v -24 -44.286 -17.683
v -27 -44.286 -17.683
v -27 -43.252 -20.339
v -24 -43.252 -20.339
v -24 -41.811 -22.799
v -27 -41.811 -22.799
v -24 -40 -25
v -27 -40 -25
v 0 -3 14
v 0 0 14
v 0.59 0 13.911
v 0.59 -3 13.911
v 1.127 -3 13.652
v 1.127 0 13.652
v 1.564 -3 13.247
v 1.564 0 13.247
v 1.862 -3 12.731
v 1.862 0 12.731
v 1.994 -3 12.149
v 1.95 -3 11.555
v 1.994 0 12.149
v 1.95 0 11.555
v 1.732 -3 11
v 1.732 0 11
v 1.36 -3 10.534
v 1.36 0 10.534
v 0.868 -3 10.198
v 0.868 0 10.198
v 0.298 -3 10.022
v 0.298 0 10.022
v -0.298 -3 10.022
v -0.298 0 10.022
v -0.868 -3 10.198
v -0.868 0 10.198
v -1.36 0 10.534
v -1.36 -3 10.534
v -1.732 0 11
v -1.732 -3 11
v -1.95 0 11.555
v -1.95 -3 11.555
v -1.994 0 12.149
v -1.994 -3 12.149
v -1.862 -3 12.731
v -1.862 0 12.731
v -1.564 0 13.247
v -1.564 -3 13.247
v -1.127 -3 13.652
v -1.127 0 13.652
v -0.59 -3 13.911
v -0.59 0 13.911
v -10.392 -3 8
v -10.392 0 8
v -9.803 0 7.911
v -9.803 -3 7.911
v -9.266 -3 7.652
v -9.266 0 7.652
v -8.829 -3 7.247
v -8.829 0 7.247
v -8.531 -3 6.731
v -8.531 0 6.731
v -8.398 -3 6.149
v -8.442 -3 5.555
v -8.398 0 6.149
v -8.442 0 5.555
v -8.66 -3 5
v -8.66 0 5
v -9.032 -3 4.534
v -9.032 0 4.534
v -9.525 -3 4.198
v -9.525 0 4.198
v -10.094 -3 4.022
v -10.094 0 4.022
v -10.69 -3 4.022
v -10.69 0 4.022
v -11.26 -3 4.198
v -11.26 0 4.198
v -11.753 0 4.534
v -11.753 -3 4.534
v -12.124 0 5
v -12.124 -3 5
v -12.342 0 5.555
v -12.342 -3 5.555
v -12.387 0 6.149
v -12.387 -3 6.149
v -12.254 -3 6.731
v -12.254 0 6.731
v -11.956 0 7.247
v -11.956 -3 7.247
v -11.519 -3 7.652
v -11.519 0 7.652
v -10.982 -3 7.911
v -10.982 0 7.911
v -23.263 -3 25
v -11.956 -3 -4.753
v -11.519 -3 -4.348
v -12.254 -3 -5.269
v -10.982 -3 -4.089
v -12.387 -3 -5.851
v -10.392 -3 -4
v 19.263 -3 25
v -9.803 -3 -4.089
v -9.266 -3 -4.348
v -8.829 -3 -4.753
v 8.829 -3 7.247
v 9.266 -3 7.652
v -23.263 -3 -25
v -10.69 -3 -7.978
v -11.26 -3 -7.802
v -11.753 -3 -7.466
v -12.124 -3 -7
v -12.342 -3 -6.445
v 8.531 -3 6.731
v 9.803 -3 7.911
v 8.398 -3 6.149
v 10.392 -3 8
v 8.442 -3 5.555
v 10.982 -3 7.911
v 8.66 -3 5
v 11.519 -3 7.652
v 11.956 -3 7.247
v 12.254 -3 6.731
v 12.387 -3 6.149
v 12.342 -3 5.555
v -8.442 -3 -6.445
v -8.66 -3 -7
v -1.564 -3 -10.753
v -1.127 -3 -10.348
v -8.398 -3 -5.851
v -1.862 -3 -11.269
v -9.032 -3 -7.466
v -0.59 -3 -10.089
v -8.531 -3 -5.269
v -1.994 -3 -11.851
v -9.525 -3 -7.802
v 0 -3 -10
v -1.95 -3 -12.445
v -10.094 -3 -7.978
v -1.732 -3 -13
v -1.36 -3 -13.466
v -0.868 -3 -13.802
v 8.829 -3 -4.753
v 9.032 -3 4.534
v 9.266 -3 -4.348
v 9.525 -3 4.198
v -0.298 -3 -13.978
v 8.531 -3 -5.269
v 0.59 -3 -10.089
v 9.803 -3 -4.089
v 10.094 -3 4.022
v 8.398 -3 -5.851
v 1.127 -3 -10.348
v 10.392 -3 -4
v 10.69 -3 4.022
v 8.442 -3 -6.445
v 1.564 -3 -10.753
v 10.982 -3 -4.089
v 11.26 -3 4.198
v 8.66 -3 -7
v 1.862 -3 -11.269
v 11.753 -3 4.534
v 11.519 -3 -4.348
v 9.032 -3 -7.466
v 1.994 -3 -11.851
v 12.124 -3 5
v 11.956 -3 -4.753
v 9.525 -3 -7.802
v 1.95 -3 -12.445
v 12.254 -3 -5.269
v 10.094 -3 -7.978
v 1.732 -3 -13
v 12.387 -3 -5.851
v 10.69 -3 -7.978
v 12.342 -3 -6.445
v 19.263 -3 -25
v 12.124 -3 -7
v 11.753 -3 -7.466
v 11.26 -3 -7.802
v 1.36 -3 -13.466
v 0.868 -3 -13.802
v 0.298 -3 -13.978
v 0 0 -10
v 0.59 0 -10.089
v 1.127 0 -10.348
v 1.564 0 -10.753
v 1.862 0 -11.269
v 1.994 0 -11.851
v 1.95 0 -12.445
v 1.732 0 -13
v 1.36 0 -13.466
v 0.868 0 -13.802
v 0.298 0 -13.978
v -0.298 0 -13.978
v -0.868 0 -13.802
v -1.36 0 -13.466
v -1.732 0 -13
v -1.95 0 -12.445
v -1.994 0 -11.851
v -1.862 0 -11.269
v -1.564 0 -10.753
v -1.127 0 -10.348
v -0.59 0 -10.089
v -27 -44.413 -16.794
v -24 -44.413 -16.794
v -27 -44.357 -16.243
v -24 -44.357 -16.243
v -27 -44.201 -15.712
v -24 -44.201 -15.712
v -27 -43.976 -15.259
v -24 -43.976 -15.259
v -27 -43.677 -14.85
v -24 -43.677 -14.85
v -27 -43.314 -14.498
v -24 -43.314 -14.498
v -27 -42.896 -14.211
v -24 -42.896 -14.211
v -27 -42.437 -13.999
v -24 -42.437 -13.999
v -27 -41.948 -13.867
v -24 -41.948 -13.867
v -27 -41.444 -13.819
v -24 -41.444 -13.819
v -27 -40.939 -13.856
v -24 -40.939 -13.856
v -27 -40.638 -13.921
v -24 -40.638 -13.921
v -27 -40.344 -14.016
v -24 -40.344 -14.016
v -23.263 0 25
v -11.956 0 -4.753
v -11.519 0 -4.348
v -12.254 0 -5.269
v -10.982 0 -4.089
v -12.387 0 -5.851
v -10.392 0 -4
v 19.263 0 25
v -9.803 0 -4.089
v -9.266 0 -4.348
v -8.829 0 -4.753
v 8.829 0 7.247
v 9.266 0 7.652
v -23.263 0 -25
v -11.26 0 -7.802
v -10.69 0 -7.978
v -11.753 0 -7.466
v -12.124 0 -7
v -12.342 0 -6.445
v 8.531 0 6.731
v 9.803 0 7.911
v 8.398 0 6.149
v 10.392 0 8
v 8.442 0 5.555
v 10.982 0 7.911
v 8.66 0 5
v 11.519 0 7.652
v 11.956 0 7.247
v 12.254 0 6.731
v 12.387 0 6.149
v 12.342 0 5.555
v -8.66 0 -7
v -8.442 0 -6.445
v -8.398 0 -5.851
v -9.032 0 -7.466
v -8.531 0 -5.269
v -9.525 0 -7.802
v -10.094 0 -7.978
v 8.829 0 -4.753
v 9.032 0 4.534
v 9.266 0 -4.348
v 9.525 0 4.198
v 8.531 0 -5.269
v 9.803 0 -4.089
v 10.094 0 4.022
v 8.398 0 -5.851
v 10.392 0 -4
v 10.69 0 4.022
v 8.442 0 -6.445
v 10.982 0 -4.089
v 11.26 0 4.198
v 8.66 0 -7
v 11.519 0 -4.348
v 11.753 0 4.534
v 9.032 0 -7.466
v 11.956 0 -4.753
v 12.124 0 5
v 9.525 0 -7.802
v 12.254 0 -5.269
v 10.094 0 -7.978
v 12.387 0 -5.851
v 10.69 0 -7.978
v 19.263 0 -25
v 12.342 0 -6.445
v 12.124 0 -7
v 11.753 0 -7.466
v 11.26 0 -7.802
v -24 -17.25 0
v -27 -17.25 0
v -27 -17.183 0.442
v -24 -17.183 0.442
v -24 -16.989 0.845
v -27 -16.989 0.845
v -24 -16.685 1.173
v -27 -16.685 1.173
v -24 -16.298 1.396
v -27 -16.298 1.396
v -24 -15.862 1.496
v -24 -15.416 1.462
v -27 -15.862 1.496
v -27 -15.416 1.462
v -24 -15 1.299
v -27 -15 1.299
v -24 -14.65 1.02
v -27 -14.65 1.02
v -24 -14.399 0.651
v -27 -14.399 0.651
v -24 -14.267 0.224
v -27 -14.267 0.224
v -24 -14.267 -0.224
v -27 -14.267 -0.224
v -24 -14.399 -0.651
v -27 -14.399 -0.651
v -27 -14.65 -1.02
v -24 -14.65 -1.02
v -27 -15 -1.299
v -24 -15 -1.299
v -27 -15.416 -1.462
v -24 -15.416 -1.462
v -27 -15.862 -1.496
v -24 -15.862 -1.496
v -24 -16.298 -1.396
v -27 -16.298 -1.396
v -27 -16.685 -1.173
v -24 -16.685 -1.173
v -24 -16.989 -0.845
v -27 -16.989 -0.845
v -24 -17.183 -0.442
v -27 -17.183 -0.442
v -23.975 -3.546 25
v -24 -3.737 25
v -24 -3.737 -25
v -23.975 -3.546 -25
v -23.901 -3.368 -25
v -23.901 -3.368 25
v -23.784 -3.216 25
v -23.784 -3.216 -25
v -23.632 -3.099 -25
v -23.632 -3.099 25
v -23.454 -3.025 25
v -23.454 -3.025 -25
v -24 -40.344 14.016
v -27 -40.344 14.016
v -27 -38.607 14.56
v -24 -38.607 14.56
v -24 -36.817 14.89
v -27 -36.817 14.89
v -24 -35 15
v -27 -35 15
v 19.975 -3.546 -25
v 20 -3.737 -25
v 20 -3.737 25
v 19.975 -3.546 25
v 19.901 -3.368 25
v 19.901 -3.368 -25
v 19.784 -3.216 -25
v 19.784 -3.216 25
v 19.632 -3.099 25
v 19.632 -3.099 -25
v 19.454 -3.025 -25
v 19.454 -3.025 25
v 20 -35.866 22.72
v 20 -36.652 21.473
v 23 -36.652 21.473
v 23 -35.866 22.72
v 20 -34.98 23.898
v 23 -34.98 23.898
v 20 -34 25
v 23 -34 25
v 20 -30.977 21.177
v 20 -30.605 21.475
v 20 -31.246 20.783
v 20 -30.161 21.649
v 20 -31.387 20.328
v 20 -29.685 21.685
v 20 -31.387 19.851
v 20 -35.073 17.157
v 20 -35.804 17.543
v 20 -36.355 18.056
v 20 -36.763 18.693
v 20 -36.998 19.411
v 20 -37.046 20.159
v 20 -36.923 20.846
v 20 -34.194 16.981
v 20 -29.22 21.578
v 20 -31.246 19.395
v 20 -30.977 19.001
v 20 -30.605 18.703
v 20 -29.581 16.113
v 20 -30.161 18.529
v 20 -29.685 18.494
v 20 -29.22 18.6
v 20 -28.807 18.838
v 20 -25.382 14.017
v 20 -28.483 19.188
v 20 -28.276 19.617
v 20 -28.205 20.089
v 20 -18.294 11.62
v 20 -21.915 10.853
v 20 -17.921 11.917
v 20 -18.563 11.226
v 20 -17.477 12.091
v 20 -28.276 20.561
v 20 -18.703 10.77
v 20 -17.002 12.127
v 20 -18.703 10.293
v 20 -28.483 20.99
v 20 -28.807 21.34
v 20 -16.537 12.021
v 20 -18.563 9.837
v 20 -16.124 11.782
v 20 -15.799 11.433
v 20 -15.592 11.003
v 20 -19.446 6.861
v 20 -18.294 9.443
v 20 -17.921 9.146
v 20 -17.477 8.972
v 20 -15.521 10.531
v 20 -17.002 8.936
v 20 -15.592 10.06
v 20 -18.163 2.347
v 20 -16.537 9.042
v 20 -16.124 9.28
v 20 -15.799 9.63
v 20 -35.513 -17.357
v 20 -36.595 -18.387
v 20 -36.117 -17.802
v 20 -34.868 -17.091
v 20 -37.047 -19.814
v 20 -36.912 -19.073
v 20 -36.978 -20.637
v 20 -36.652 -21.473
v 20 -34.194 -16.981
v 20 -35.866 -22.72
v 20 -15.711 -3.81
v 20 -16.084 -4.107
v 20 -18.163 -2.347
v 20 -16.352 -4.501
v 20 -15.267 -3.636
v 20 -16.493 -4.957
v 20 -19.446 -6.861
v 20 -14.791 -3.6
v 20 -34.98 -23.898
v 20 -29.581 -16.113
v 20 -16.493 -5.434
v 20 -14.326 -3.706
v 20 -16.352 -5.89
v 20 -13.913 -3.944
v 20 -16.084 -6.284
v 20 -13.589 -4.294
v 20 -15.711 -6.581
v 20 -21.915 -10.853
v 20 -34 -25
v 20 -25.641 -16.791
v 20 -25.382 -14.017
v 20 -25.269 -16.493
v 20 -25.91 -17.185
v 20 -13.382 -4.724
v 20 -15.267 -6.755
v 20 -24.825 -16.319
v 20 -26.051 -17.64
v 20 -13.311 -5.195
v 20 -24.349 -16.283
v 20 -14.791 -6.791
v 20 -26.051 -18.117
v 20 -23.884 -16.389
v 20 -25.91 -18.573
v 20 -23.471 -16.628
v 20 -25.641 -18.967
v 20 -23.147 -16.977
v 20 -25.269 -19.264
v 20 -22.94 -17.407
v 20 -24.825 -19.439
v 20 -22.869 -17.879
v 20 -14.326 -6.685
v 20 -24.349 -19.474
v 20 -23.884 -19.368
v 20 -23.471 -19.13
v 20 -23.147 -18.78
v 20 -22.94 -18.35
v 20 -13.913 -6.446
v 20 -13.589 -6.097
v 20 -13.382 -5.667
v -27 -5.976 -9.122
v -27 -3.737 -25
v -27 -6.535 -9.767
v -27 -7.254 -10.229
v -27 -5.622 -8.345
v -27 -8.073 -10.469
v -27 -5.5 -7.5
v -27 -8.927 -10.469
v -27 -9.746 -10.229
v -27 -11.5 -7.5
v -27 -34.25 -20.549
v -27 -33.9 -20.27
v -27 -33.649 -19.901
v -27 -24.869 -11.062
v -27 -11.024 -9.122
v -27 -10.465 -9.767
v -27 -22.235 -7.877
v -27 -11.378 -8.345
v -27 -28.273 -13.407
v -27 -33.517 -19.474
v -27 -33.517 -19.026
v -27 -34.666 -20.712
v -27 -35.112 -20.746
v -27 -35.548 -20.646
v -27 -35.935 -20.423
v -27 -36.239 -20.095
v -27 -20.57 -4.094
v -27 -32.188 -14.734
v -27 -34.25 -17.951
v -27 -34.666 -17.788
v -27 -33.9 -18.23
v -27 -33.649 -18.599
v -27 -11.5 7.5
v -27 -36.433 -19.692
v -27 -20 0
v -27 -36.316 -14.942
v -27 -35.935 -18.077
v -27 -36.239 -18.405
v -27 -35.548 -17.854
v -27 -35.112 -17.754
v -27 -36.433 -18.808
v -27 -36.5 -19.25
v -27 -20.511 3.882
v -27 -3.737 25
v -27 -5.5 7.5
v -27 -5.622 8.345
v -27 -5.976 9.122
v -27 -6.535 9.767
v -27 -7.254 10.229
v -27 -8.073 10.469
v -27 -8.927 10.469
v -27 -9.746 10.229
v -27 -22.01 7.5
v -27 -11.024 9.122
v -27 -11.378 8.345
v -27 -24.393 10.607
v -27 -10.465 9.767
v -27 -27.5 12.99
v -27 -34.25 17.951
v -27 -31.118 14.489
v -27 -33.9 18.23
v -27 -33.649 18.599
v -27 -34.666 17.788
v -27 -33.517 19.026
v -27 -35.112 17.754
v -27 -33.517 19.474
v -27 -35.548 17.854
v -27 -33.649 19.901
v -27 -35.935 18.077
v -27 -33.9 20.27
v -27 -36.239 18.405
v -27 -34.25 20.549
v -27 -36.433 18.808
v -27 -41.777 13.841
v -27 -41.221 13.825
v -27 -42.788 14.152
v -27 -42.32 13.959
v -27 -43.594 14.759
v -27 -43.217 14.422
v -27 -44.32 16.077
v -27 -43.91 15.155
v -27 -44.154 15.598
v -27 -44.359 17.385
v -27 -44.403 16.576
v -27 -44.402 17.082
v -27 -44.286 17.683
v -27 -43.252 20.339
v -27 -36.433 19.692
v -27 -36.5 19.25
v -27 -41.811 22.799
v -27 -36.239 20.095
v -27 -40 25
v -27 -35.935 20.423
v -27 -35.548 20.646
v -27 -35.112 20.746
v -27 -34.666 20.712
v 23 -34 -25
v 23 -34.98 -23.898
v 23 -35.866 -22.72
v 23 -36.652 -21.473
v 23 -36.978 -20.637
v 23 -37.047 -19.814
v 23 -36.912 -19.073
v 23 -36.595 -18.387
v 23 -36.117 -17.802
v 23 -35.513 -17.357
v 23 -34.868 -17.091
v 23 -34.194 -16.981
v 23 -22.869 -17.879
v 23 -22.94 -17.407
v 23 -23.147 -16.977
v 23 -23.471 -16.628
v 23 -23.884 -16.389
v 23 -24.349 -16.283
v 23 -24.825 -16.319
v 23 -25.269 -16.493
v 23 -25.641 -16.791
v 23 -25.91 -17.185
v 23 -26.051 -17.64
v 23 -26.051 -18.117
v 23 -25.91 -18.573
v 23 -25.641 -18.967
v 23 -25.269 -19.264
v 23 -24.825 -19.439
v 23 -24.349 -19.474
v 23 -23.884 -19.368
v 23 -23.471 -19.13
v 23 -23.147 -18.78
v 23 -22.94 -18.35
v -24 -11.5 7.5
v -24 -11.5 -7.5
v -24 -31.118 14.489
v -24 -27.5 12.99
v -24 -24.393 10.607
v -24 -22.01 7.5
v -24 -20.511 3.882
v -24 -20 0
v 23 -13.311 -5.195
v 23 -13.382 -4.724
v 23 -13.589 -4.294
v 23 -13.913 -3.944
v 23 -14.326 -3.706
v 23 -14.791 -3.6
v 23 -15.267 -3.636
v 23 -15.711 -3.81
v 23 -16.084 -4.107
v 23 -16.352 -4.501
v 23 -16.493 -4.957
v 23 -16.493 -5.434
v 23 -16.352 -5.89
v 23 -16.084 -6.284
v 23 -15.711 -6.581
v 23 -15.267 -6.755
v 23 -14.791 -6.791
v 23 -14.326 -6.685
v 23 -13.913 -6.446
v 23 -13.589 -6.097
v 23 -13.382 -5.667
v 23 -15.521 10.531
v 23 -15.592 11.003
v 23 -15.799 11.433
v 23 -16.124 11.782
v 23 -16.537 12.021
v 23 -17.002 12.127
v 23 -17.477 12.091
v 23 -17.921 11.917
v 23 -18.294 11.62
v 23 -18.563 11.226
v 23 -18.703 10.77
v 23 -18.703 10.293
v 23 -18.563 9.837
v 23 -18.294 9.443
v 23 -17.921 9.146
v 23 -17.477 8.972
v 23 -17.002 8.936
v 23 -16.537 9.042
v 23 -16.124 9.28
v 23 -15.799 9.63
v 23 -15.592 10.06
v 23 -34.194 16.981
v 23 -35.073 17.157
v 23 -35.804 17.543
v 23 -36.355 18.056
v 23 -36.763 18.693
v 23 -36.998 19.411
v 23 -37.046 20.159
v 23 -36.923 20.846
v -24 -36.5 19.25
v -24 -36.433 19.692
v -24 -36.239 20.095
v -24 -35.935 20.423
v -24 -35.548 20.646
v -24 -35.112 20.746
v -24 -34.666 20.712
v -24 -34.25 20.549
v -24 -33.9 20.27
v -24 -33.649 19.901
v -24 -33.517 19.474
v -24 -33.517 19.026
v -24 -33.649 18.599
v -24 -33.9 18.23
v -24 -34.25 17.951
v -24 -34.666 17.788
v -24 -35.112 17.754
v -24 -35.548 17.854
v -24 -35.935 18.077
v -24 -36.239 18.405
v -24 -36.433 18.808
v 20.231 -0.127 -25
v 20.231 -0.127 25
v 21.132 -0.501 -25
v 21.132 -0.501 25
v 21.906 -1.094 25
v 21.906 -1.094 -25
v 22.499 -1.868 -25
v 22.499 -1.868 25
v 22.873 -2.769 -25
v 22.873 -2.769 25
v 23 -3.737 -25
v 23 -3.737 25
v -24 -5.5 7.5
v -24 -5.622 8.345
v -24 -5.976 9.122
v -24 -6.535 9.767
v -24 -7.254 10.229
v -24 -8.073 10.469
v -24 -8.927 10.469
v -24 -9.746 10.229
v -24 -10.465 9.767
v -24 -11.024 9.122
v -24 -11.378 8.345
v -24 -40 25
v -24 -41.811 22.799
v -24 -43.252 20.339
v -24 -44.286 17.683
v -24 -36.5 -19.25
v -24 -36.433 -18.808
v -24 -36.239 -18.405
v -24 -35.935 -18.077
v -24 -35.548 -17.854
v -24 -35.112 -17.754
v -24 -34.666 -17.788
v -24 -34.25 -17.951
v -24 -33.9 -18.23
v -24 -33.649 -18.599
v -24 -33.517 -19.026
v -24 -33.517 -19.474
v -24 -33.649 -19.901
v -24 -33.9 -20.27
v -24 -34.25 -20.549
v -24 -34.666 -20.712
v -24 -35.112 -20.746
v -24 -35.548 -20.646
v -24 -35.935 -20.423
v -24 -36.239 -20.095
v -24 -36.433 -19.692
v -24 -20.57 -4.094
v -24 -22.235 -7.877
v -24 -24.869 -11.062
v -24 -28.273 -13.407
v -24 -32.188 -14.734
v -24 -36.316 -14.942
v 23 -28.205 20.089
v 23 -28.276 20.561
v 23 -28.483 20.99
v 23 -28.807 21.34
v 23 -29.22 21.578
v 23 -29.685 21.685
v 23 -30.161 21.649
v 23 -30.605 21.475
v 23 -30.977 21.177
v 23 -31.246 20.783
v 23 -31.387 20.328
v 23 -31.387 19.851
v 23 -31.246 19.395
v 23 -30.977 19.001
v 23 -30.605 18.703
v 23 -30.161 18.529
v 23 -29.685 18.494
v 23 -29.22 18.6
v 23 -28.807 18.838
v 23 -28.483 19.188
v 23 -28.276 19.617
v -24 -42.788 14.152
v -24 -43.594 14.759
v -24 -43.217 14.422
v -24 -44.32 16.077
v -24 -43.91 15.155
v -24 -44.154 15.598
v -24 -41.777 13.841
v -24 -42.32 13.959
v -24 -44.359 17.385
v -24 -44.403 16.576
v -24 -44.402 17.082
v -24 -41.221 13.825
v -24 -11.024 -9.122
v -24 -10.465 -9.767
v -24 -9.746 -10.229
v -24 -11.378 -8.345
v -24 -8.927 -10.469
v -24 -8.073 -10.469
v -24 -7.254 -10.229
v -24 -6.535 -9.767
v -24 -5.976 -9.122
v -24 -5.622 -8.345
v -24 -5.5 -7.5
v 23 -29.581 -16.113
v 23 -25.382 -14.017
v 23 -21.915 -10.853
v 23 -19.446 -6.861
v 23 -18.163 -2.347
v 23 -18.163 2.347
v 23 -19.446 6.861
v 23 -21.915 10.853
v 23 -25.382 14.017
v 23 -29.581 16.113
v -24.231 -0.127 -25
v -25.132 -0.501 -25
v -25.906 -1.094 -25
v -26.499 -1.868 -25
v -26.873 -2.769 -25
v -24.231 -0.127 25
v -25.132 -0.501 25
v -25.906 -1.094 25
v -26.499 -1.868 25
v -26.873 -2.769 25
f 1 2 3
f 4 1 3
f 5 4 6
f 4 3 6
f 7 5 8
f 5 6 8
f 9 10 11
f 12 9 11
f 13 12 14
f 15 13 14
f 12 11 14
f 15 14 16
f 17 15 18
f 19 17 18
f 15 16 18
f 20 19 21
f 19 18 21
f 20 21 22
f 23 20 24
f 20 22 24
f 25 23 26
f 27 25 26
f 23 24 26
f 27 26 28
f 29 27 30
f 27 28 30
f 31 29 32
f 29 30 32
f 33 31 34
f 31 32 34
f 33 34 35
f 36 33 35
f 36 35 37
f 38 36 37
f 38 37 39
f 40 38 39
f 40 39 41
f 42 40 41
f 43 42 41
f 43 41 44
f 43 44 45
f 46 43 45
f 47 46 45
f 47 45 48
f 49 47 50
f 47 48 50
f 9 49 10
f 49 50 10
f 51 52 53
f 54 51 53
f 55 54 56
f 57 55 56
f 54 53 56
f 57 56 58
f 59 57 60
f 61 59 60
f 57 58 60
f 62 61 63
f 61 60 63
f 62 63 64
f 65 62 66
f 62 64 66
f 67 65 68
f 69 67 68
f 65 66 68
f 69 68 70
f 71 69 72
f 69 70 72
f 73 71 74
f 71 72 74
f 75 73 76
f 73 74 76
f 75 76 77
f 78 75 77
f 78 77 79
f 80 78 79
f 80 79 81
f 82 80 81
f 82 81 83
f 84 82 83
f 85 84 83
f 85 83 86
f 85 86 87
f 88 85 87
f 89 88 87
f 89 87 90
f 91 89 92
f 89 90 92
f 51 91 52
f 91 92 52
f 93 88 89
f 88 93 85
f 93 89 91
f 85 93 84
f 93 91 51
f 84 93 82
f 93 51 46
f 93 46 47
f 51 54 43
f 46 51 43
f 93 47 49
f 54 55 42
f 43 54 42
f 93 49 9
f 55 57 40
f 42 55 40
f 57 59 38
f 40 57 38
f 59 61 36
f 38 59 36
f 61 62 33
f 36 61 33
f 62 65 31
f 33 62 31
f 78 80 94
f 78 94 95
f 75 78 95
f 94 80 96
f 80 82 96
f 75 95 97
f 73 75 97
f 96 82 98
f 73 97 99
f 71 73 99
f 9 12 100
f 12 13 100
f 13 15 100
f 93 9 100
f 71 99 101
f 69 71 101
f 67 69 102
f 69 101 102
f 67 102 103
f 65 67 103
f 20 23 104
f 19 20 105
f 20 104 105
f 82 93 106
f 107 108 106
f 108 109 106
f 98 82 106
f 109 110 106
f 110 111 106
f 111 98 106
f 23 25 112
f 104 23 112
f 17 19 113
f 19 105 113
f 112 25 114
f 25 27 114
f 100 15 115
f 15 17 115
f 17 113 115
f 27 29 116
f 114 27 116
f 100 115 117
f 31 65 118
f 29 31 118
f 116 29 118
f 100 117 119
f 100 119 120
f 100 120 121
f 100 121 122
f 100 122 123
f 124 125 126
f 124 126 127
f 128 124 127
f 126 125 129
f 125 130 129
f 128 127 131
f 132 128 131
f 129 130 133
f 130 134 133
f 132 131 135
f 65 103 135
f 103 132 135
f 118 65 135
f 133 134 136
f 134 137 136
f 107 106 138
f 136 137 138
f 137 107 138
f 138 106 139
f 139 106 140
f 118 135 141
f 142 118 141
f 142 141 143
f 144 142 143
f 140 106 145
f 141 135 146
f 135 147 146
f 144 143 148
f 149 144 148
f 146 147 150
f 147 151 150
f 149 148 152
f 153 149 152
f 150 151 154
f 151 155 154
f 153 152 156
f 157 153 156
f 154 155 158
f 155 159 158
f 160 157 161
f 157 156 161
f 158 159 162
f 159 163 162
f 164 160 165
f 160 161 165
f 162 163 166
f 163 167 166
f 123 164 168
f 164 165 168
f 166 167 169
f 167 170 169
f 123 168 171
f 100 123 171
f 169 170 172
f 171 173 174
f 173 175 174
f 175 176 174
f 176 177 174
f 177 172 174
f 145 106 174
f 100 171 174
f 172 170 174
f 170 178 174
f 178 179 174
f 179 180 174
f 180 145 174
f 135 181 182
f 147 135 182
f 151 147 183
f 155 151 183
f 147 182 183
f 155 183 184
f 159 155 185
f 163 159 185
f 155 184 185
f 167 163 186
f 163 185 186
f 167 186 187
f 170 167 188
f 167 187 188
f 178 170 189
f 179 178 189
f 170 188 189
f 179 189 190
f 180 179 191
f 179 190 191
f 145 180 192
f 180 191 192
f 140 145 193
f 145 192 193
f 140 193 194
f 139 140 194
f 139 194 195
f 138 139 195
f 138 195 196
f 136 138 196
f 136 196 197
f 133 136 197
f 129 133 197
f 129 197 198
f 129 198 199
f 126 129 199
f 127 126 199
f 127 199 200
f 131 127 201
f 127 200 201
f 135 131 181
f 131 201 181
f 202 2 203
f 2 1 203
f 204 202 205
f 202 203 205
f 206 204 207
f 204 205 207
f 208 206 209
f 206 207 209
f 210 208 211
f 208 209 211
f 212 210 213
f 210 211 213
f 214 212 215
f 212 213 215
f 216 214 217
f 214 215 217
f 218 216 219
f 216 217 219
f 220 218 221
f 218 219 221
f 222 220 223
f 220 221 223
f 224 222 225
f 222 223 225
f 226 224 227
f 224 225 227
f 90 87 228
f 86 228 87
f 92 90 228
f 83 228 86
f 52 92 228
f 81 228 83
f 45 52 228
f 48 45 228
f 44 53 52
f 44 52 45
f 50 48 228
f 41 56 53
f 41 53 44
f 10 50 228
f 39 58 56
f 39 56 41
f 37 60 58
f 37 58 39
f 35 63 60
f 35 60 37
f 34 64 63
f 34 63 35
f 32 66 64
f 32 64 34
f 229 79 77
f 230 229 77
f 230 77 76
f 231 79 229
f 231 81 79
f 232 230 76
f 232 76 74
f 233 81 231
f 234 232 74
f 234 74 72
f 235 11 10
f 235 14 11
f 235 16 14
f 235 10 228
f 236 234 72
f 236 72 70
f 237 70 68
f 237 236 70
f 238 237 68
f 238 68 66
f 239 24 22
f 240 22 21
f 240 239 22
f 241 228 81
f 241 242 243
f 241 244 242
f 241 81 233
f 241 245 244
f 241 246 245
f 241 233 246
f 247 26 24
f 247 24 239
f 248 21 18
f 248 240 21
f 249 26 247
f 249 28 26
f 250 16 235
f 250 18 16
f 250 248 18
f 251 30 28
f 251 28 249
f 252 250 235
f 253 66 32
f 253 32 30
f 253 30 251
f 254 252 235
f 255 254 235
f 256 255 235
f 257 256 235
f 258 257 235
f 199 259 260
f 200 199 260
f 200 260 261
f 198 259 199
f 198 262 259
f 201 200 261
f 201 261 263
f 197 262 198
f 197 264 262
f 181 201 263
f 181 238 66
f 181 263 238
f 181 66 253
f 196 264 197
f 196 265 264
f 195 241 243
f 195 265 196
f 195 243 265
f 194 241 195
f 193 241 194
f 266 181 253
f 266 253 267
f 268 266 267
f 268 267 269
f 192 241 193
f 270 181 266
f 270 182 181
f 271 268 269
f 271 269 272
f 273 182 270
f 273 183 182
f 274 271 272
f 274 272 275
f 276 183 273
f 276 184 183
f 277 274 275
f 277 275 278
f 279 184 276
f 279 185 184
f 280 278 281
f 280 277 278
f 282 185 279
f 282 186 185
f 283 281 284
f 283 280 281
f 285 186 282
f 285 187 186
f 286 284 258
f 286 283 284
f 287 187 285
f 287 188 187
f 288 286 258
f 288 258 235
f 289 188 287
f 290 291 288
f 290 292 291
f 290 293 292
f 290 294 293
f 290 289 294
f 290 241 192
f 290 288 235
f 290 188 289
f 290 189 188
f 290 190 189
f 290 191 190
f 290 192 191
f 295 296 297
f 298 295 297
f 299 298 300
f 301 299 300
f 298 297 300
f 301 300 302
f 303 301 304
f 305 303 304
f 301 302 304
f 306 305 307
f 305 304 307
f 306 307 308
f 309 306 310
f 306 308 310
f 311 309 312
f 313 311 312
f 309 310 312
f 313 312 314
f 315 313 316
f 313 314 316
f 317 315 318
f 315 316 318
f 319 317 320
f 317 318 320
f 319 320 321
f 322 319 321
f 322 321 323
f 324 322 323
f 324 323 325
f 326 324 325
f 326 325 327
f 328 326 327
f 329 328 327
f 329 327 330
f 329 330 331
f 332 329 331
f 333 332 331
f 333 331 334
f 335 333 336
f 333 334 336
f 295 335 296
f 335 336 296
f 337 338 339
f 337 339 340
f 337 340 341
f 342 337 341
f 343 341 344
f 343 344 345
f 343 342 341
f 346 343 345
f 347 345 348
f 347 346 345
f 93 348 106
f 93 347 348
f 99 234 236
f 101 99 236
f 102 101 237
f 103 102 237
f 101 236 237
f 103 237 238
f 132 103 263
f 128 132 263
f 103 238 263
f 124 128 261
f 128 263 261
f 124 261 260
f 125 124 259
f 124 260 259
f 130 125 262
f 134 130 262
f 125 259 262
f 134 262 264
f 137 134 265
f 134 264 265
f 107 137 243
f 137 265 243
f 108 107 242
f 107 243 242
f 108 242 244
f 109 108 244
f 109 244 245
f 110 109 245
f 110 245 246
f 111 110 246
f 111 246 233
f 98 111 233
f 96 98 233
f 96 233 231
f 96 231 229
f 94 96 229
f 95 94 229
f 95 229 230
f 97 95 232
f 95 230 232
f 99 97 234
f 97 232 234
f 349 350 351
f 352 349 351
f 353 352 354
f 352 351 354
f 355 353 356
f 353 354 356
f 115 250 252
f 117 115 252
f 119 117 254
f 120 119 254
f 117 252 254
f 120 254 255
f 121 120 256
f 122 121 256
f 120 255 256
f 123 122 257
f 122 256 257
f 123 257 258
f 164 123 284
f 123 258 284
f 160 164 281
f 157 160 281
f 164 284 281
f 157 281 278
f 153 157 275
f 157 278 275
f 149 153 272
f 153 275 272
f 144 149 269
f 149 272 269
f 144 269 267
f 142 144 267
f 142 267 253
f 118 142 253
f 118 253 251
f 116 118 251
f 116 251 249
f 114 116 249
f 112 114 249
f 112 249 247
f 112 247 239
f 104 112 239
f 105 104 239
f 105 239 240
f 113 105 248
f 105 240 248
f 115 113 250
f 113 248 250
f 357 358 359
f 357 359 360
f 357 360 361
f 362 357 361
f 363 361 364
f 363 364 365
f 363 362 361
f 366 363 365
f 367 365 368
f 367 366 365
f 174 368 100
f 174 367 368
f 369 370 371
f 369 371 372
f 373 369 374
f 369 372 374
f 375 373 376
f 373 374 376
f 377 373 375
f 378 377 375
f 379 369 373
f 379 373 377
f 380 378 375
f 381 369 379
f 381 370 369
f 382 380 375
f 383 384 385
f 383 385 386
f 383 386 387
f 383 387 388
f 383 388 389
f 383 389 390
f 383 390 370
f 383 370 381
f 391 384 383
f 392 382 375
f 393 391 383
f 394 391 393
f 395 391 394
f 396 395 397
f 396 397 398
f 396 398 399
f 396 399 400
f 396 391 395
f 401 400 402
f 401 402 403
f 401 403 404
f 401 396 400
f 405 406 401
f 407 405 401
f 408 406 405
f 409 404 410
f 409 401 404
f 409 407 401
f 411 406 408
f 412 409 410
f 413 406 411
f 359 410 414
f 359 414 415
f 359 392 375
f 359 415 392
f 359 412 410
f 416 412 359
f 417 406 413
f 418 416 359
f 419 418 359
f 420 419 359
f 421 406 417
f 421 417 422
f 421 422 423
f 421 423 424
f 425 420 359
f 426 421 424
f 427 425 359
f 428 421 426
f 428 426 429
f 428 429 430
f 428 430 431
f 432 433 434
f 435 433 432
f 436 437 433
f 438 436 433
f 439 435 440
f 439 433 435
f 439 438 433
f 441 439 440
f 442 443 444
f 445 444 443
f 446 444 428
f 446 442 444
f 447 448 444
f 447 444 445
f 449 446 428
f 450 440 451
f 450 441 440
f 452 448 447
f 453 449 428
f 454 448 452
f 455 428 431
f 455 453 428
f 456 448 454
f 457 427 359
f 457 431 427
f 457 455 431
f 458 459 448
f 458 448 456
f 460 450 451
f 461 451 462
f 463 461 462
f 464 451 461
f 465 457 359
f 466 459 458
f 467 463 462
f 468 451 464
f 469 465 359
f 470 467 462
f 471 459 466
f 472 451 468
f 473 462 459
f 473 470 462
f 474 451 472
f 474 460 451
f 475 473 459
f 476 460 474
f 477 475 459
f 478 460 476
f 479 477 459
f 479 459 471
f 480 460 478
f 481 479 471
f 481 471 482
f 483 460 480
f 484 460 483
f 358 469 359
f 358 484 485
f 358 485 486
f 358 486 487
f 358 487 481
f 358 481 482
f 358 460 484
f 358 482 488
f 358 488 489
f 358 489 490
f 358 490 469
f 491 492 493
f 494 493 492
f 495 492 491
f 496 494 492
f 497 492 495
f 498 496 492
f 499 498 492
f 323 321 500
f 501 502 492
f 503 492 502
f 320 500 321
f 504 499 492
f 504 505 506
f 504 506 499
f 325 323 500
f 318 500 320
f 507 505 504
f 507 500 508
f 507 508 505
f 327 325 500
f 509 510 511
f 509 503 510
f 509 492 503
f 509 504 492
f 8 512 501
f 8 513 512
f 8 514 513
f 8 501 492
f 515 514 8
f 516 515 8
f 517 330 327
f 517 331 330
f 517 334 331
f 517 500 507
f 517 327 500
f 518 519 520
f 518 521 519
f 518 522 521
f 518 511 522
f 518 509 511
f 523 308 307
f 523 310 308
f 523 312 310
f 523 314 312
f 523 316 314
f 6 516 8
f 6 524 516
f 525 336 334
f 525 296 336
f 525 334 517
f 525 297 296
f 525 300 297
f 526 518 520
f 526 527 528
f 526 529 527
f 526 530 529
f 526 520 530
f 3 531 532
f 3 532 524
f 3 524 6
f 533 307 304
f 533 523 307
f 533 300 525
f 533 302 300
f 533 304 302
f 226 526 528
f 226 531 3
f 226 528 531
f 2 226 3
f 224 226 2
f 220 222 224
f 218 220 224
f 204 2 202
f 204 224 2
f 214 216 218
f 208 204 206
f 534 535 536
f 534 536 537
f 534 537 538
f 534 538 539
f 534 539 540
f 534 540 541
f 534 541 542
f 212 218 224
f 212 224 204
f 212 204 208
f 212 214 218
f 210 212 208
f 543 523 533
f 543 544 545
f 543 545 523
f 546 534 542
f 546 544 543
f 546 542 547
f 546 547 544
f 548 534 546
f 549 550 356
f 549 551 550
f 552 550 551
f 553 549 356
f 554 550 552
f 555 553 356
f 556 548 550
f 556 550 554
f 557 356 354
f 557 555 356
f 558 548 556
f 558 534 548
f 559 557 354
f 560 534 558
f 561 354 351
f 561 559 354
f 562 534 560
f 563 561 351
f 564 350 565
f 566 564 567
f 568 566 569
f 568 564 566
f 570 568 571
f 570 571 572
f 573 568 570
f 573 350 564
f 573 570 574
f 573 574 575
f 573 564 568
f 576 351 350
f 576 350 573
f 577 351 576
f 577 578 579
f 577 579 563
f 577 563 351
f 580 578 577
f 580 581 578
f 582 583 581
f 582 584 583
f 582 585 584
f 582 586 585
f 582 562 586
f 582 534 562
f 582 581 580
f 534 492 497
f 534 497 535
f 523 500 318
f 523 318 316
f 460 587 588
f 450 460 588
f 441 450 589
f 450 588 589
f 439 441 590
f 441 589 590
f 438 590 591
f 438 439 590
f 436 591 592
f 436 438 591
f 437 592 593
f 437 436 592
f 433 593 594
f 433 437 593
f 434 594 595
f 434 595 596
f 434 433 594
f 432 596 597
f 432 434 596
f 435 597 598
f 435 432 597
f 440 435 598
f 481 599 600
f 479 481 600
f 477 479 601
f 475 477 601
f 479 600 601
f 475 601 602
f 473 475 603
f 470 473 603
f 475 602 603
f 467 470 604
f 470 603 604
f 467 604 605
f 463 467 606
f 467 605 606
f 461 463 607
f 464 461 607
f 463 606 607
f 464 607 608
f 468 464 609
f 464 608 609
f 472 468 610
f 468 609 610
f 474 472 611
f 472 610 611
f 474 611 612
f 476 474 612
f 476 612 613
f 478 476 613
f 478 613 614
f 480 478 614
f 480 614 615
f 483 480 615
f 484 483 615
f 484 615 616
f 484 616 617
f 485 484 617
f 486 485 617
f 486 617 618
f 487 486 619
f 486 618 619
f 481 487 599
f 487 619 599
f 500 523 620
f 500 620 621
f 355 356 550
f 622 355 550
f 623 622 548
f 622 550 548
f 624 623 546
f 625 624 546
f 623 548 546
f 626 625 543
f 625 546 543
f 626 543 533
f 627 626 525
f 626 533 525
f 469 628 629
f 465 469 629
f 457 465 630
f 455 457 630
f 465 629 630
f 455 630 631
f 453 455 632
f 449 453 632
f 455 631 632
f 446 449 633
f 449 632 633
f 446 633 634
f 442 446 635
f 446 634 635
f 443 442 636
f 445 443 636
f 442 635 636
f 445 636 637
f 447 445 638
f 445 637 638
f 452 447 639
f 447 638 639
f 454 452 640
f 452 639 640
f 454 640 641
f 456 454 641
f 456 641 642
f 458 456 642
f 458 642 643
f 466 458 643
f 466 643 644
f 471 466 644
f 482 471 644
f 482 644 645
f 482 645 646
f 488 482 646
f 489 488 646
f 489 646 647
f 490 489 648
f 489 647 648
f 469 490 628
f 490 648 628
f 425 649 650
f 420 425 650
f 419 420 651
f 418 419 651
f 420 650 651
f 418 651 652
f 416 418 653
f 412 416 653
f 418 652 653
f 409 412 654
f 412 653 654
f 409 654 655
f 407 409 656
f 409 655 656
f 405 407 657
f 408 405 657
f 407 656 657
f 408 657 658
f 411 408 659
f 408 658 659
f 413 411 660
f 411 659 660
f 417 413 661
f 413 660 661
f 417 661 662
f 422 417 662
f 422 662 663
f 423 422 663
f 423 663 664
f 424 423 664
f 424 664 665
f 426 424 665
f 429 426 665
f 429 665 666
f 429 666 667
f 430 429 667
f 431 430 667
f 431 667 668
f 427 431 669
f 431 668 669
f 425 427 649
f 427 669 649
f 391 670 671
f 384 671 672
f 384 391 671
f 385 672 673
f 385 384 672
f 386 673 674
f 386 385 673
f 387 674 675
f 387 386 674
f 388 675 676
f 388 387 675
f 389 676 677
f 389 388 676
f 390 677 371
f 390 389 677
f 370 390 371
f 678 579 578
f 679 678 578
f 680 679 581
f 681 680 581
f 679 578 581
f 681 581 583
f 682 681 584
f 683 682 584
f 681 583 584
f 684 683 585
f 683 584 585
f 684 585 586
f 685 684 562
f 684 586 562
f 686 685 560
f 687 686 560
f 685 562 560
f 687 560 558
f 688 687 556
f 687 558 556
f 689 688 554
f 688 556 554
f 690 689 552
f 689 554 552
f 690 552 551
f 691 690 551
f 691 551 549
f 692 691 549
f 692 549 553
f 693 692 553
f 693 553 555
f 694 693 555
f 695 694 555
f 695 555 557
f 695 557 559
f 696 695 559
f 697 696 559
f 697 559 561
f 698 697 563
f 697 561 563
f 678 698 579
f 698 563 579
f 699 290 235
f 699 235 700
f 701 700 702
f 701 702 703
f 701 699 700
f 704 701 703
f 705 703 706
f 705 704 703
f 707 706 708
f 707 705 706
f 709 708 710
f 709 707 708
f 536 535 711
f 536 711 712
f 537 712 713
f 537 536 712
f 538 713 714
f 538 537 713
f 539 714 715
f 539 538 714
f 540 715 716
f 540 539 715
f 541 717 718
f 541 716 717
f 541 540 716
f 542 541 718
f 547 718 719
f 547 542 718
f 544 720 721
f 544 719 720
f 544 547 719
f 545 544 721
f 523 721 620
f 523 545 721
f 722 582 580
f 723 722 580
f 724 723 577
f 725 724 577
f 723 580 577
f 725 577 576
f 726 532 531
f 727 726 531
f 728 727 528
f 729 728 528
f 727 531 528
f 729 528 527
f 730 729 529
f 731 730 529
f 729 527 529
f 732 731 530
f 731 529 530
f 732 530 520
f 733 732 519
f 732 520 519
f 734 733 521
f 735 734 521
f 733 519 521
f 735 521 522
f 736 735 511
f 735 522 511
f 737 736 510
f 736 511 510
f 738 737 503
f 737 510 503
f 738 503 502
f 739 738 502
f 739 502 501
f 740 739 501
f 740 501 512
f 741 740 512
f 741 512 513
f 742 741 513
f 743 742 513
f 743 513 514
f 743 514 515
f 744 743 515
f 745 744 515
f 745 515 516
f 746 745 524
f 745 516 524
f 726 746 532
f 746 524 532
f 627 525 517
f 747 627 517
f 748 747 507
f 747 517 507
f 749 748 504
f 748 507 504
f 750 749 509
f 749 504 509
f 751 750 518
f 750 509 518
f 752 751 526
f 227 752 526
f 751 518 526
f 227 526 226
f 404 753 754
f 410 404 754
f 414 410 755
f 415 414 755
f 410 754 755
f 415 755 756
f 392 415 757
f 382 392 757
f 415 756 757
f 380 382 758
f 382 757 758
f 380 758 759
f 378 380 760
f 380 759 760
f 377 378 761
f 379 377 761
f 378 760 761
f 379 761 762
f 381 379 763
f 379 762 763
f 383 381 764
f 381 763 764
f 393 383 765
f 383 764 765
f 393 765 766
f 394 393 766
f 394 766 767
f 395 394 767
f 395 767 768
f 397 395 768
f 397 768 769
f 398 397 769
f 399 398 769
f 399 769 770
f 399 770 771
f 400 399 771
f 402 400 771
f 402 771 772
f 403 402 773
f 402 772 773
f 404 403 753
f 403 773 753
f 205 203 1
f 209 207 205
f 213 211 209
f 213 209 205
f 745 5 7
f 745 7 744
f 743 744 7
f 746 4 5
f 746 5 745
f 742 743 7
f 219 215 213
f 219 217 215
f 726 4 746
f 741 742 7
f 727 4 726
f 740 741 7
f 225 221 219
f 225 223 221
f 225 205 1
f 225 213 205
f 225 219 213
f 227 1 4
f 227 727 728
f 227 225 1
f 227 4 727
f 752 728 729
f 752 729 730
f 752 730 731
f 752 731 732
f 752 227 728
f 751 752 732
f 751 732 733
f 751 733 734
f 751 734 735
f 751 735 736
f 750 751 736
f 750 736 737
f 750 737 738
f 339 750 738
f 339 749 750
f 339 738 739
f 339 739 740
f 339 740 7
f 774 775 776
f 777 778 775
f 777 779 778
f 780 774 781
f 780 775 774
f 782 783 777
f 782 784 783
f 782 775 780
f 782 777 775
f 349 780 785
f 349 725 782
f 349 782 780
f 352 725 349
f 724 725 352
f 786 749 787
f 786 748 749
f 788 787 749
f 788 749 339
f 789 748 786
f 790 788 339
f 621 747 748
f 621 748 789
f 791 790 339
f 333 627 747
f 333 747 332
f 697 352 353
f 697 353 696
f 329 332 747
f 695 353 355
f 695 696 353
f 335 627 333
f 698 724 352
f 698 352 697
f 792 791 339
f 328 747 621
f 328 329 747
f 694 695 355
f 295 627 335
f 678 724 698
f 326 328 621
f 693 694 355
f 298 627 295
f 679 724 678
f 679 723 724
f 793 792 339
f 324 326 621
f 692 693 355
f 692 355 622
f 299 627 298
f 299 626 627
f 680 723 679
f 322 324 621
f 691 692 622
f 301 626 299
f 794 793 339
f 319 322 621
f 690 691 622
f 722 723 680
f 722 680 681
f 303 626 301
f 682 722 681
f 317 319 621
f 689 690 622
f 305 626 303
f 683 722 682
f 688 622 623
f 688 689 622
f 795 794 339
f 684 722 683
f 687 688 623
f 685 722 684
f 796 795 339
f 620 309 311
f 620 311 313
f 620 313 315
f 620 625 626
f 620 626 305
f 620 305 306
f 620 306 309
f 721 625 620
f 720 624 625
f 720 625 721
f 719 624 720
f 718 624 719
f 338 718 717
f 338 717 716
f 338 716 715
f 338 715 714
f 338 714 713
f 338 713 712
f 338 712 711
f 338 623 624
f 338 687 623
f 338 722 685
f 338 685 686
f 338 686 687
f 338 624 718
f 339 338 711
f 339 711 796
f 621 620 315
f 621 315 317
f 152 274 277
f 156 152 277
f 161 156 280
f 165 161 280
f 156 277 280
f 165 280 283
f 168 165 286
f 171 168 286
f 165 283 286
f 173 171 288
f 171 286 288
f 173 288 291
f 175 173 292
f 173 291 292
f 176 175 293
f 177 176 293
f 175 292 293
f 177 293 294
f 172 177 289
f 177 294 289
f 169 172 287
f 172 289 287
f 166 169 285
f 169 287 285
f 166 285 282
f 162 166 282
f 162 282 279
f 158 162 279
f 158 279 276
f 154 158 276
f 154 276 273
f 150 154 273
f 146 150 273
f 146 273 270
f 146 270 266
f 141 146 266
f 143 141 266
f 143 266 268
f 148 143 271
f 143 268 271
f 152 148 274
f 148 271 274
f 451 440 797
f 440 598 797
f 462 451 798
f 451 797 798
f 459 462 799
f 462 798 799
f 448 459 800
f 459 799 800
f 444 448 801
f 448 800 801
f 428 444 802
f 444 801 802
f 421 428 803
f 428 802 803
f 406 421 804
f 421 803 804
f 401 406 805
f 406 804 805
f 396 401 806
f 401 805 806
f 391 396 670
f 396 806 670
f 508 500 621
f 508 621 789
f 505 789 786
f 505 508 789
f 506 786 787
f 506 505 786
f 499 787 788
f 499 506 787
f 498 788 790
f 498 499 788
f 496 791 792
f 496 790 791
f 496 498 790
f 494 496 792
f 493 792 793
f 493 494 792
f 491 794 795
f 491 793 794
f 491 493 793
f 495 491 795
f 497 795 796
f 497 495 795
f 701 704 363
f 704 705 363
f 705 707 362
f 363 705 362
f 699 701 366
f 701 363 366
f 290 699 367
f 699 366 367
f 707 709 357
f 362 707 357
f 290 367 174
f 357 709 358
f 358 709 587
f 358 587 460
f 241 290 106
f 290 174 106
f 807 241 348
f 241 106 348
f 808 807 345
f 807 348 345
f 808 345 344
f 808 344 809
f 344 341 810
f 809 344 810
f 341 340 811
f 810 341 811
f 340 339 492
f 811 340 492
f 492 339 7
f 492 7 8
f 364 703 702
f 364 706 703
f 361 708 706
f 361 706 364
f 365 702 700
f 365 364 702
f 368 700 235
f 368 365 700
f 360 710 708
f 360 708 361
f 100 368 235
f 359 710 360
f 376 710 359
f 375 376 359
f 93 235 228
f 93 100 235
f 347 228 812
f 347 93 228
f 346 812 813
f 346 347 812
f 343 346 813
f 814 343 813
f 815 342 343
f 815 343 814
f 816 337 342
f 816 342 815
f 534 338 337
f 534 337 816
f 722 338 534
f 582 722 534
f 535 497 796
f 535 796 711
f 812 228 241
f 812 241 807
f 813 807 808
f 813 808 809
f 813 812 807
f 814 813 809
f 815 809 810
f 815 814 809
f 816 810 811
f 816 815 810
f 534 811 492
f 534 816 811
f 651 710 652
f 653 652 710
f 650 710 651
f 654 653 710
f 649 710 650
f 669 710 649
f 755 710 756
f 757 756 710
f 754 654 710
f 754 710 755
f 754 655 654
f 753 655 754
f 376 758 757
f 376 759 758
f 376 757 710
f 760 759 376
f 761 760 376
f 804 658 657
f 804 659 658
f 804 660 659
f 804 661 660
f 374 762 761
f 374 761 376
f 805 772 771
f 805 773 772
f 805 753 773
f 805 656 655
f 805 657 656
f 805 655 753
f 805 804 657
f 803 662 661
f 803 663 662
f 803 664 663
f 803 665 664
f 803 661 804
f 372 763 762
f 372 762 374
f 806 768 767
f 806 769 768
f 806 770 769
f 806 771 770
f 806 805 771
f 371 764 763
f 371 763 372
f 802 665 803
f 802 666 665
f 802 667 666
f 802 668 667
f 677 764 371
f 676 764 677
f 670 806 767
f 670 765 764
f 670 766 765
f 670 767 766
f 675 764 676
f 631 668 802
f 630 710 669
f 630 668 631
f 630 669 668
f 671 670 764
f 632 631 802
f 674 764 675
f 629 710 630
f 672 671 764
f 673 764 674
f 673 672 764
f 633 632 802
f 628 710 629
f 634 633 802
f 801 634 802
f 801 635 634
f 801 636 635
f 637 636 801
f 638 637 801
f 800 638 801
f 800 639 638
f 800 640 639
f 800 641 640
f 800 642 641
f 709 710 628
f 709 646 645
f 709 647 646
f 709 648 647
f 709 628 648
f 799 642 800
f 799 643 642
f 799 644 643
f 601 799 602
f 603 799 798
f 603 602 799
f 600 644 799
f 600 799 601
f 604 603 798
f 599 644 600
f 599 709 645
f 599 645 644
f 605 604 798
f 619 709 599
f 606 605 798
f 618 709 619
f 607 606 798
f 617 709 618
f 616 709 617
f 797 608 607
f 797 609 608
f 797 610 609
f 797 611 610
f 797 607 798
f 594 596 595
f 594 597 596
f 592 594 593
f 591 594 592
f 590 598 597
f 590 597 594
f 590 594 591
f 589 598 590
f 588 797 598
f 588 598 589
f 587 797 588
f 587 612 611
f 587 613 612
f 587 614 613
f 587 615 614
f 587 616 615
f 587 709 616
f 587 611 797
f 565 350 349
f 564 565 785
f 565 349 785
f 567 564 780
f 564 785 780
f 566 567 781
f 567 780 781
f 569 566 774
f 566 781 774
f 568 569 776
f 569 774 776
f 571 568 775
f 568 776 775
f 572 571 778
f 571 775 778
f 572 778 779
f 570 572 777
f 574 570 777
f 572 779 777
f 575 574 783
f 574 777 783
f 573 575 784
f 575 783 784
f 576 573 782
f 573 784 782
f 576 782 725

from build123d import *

# Parameters (mm, degrees)
SKETCH_1_W                       = 44
SKETCH_1_H                       = 50
SKETCH_1_R                       = 2
SM_BASE_FLANGE_1_DEPTH           = 3
SM_EDGE_FLANGE_1_STRIP_W         = 13.4732
SM_EDGE_FLANGE_1_STRIP_H         = 3
SM_EDGE_FLANGE_1_STRIP_CUT_DEPTH = 50
SM_EDGE_FLANGE_1_DEPTH           = 50
SM_EDGE_FLANGE_2_STRIP_W         = 13.4732
SM_EDGE_FLANGE_2_STRIP_H         = 3
SM_EDGE_FLANGE_2_STRIP_CUT_DEPTH = 50
SM_EDGE_FLANGE_2_DEPTH           = 50
SKETCH_15_R                      = 15
SKETCH_15_R_2                    = 1.5
CUT_EXTRUDE_1_DEPTH              = 3
SKETCH_16_R                      = 1.6
SKETCH_16_R_2                    = 17
CUT_EXTRUDE_2_DEPTH              = 3
CUT_EXTRUDE_5_DEPTH              = 3
SKETCH_18_R                      = 1.6
CUT_EXTRUDE_6_DEPTH              = 3
FILLET_2_R                       = 3
CUT_EXTRUDE_7_DEPTH              = 10


# Sheet-metal steps are written as plain solids
with BuildPart() as part:
    # Sketch 1 → 基体-法兰1 (new body)
    with BuildSketch(Plane(origin=(0, 0, 0), x_dir=(1, 0, 0), z_dir=(0, 1, 0))):
        with Locations((-2, 0)):
            Rectangle(SKETCH_1_W, SKETCH_1_H)
        with Locations(Location((0, 12, 0), (0, 0, 270))):
            Circle(SKETCH_1_R, mode=Mode.SUBTRACT)
        with Locations(Location((10.392304845, 6, 0), (0, 0, 270))):
            Circle(SKETCH_1_R, mode=Mode.SUBTRACT)
        with Locations(Location((10.392304845, -6, 0), (0, 0, 270))):
            Circle(SKETCH_1_R, mode=Mode.SUBTRACT)
        with Locations(Location((0, -12, 0), (0, 0, 270))):
            Circle(SKETCH_1_R, mode=Mode.SUBTRACT)
        with Locations(Location((-10.392304845, -6, 0), (0, 0, 270))):
            Circle(SKETCH_1_R, mode=Mode.SUBTRACT)
        with Locations(Location((-10.392304845, 6, 0), (0, 0, 270))):
            Circle(SKETCH_1_R, mode=Mode.SUBTRACT)
    extrude(amount=-SM_BASE_FLANGE_1_DEPTH)

    # 边线-法兰1 strip (across the edge) → 边线-法兰1 strip cut (cut)
    with BuildSketch(Plane(origin=(20, -3, -25), x_dir=(-1, 0, 0), z_dir=(0, 0, 1))):
        with Locations((-6, -1.5)):
            Rectangle(SM_EDGE_FLANGE_1_STRIP_W, SM_EDGE_FLANGE_1_STRIP_H)
    extrude(amount=SM_EDGE_FLANGE_1_STRIP_CUT_DEPTH, mode=Mode.SUBTRACT)

    # 边线-法兰1 section (across the edge) → 边线-法兰1 (add)
    with BuildSketch(Plane(origin=(20, -3, -25), x_dir=(-1, 0, 0), z_dir=(0, 0, 1))):
        with BuildLine():
            Line((-3, 0.7366), (-3, 57))
            Line((-3, 57), (0, 57))
            Line((0, 57), (0, 0.7366))
            ThreePointArc((0, 0.7366), (0.215745145, 0.215745145), (0.7366, 0))
            Line((0.7366, 0), (0.7366, -3))
            ThreePointArc((0.7366, -3), (-1.905575199, -1.905575199), (-3, 0.7366))
        make_face()
    extrude(amount=SM_EDGE_FLANGE_1_DEPTH)

    # 边线-法兰2 strip (across the edge) → 边线-法兰2 strip cut (cut)
    with BuildSketch(Plane(origin=(-24, -3, 25), x_dir=(1, 0, 0), z_dir=(0, 0, -1))):
        with Locations((-6, -1.5)):
            Rectangle(SM_EDGE_FLANGE_2_STRIP_W, SM_EDGE_FLANGE_2_STRIP_H)
    extrude(amount=SM_EDGE_FLANGE_2_STRIP_CUT_DEPTH, mode=Mode.SUBTRACT)

    # 边线-法兰2 section (across the edge) → 边线-法兰2 (add)
    with BuildSketch(Plane(origin=(-24, -3, 25), x_dir=(1, 0, 0), z_dir=(0, 0, -1))):
        with BuildLine():
            Line((-3, 0.7366), (-3, 57))
            Line((-3, 57), (0, 57))
            Line((0, 57), (0, 0.7366))
            ThreePointArc((0, 0.7366), (0.215745145, 0.215745145), (0.7366, 0))
            Line((0.7366, 0), (0.7366, -3))
            ThreePointArc((0.7366, -3), (-1.905575199, -1.905575199), (-3, 0.7366))
        make_face()
    extrude(amount=SM_EDGE_FLANGE_2_DEPTH)

    # 草图15 → 切除-拉伸1 (cut)
    with BuildSketch(Plane.ZY.offset(27)):
        with Locations(Location((0, -35, 0), (0, 0, 270))):
            Circle(SKETCH_15_R)
        with Locations(Location((0, -15.75, 0), (0, 0, 270))):
            Circle(SKETCH_15_R_2)
        with Locations(Location((19.25, -35, 0), (0, 0, 270))):
            Circle(SKETCH_15_R_2)
        with Locations(Location((0, -54.25, 0), (0, 0, 270))):
            Circle(SKETCH_15_R_2)
        with Locations(Location((-19.25, -35, 0), (0, 0, 270))):
            Circle(SKETCH_15_R_2)
    extrude(amount=-CUT_EXTRUDE_1_DEPTH, mode=Mode.SUBTRACT)

    # 草图16 → 切除-拉伸2 (cut)
    with BuildSketch(Plane(origin=(23, 0, 0), x_dir=(0, 0, -1), z_dir=(1, 0, 0))):
        with Locations(Location((17.878805079, -24.468578969, 0), (0, 0, 90))):
            Circle(SKETCH_16_R)
        with Locations(Location((20.089063538, -40.195385084, 0), (0, 0, 90))):
            Circle(SKETCH_16_R)
        with Locations(Location((10.531421031, -52.878805079, 0), (0, 0, 90))):
            Circle(SKETCH_16_R)
        with BuildLine():
            ThreePointArc((-3.595385084, -55.089063538), (-4.993466734, -53.501855618), (-6.744421309, -54.688455531))
            ThreePointArc((-6.744421309, -54.688455531), (-5.595993091, -56.638099762), (-3.64634886, -55.489671544))
            ThreePointArc((-3.64634886, -55.489671544), (-3.608177165, -55.290981888), (-3.595385084, -55.089063538))
        make_face()
        with Locations(Location((-17.878805079, -45.531421031, 0), (0, 0, 90))):
            Circle(SKETCH_16_R)
        with Locations(Location((-20.089063538, -29.804614916, 0), (0, 0, 90))):
            Circle(SKETCH_16_R)
        with Locations(Location((-10.531421031, -17.121194921, 0), (0, 0, 90))):
            Circle(SKETCH_16_R)
        with Locations(Location((5.195385084, -14.910936462, 0), (0, 0, 90))):
            Circle(SKETCH_16_R)
        with Locations(Location((0, -35, 0), (0, 0, 90))):
            Circle(SKETCH_16_R_2)
    extrude(amount=-CUT_EXTRUDE_2_DEPTH, mode=Mode.SUBTRACT)

    # 草图17 → 切除-拉伸5 (cut)
    with BuildSketch(Plane.ZY.offset(27)):
        with BuildLine():
            ThreePointArc((0, -50), (-6.123724357, -48.693063938), (-11.180339887, -45))
            ThreePointArc((-11.180339887, -45), (-18.623701364, -43.974644577), (-25, -40))
            Line((-25, -40), (-25, -60))
            Line((-25, -60), (0, -60))
            Line((0, -60), (0, -55.75))
            ThreePointArc((0, -55.75), (-1.5, -54.25), (0, -52.75))
            Line((0, -52.75), (0, -50))
        make_face()
        with BuildLine():
            Line((25, -60), (25, -40))
            ThreePointArc((25, -40), (18.623701364, -43.974644577), (11.180339887, -45))
            ThreePointArc((11.180339887, -45), (6.123724357, -48.693063938), (0, -50))
            Line((0, -50), (0, -52.75))
            ThreePointArc((0, -52.75), (1.060660172, -53.189339828), (1.5, -54.25))
            ThreePointArc((1.5, -54.25), (1.060660172, -55.310660172), (0, -55.75))
            Line((0, -55.75), (0, -60))
            Line((0, -60), (25, -60))
        make_face()
        with BuildLine():
            ThreePointArc((15, -35), (10.606601718, -24.393398282), (0, -20))
            Line((0, -20), (0, -45))
            Line((0, -45), (11.180339887, -45))
            ThreePointArc((11.180339887, -45), (14.012585384, -40.352331347), (15, -35))
        make_face()
        with BuildLine():
            Line((0, -45), (0, -20))
            ThreePointArc((0, -20), (-13.693063938, -28.876275643), (-11.180339887, -45))
            Line((-11.180339887, -45), (0, -45))
        make_face()
        with BuildLine():
            Line((11.180339887, -45), (0, -45))
            Line((0, -45), (0, -50))
            ThreePointArc((0, -50), (6.123724357, -48.693063938), (11.180339887, -45))
        make_face()
        with BuildLine():
            Line((0, -50), (0, -45))
            Line((0, -45), (-11.180339887, -45))
            ThreePointArc((-11.180339887, -45), (-6.123724357, -48.693063938), (0, -50))
        make_face()
    extrude(amount=-CUT_EXTRUDE_5_DEPTH, mode=Mode.SUBTRACT)

    # 草图18 → 切除-拉伸6 (cut)
    # profile 1 of 5: a face of its own
    with BuildSketch(Plane(origin=(23, 0, 0), x_dir=(0, 0, -1), z_dir=(1, 0, 0))):
        with BuildLine():
            ThreePointArc((13.743814378, -45.005376871), (0, -52), (-13.743814378, -45.005376871))
            ThreePointArc((-13.743814378, -45.005376871), (-15.17808001, -44.848040907), (-16.595135856, -44.576332908))
            ThreePointArc((-16.595135856, -44.576332908), (-16.359945185, -45.028365745), (-16.278805079, -45.531421031))
            ThreePointArc((-16.278805079, -45.531421031), (-18.786243203, -46.849205555), (-18.449500144, -44.036661137))
            ThreePointArc((-18.449500144, -44.036661137), (-21.942963359, -42.372436612), (-25, -40))
            Line((-25, -40), (-25, -60))
            Line((-25, -60), (25, -60))
            Line((25, -60), (25, -40))
            ThreePointArc((25, -40), (19.81343454, -43.495603445), (13.743814378, -45.005376871))
        make_face()
        with Locations((-5.195385084, -55.089063538)):
            Circle(SKETCH_18_R, mode=Mode.SUBTRACT)
        with Locations((10.531421031, -52.878805079)):
            Circle(SKETCH_18_R, mode=Mode.SUBTRACT)
    # profile 2 of 5: a face of its own
    with BuildSketch(Plane(origin=(23, 0, 0), x_dir=(0, 0, -1), z_dir=(1, 0, 0))):
        with BuildLine():
            Line((11.180339887, -45), (-11.180339887, -45))
            ThreePointArc((-11.180339887, -45), (-12.461981292, -45.048381264), (-13.743814378, -45.005376871))
            ThreePointArc((-13.743814378, -45.005376871), (0, -52), (13.743814378, -45.005376871))
            ThreePointArc((13.743814378, -45.005376871), (12.461981292, -45.048381264), (11.180339887, -45))
        make_face()
    # profile 3 of 5: a face of its own
    with BuildSketch(Plane(origin=(23, 0, 0), x_dir=(0, 0, -1), z_dir=(1, 0, 0))):
        with BuildLine():
            ThreePointArc((-16.595135856, -44.576332908), (-15.17808001, -44.848040907), (-13.743814378, -45.005376871))
            ThreePointArc((-13.743814378, -45.005376871), (-15.519532338, -41.938596112), (-16.620858499, -38.570302896))
            ThreePointArc((-16.620858499, -38.570302896), (-21.118873978, -36.850650515), (-25, -34))
            Line((-25, -34), (-25, -40))
            ThreePointArc((-25, -40), (-21.942963359, -42.372436612), (-18.449500144, -44.036661137))
            ThreePointArc((-18.449500144, -44.036661137), (-17.431709516, -43.995157526), (-16.595135856, -44.576332908))
        make_face()
    # profile 4 of 5: a face of its own
    with BuildSketch(Plane(origin=(23, 0, 0), x_dir=(0, 0, -1), z_dir=(1, 0, 0))):
        with BuildLine():
            ThreePointArc((-13.743814378, -45.005376871), (-12.461981292, -45.048381264), (-11.180339887, -45))
            Line((-11.180339887, -45), (11.180339887, -45))
            ThreePointArc((11.180339887, -45), (12.461981292, -45.048381264), (13.743814378, -45.005376871))
            ThreePointArc((13.743814378, -45.005376871), (15.519532338, -41.938596112), (16.620858499, -38.570302896))
            ThreePointArc((16.620858499, -38.570302896), (13.916978953, -38.992540305), (11.180339887, -39))
            Line((11.180339887, -39), (-11.180339887, -39))
            ThreePointArc((-11.180339887, -39), (-13.916978953, -38.992540305), (-16.620858499, -38.570302896))
            ThreePointArc((-16.620858499, -38.570302896), (-15.519532338, -41.938596112), (-13.743814378, -45.005376871))
        make_face()
    # profile 5 of 5: a face of its own
    with BuildSketch(Plane(origin=(23, 0, 0), x_dir=(0, 0, -1), z_dir=(1, 0, 0))):
        with BuildLine():
            ThreePointArc((16.620858499, -38.570302896), (15.519532338, -41.938596112), (13.743814378, -45.005376871))
            ThreePointArc((13.743814378, -45.005376871), (19.81343454, -43.495603445), (25, -40))
            Line((25, -40), (25, -34))
            ThreePointArc((25, -34), (21.118873978, -36.850650515), (16.620858499, -38.570302896))
        make_face()
        with Locations((20.089063538, -40.195385084)):
            Circle(SKETCH_18_R, mode=Mode.SUBTRACT)
    extrude(amount=-CUT_EXTRUDE_6_DEPTH, mode=Mode.SUBTRACT)

    # 圆角2
    fillet_2_edges = [part.edges().sort_by_distance(p)[0] for p in [
        (-25.5, -45, 11.180339887),
        (-25.5, -45, -11.180339887),
        (21.5, -38.570302896, -16.620858499),
        (21.5, -38.570302896, 16.620858499),
    ]]
    fillet(fillet_2_edges, radius=FILLET_2_R)

    # 草图19 → 切除-拉伸7 (cut)
    with BuildSketch(Plane.ZY.offset(27)):
        with BuildLine():
            Line((-7.5, -5.5), (7.5, -5.5))
            ThreePointArc((7.5, -5.5), (10.5, -8.5), (7.5, -11.5))
            Line((7.5, -11.5), (-7.5, -11.5))
            ThreePointArc((-7.5, -11.5), (-10.5, -8.5), (-7.5, -5.5))
        make_face()
    extrude(amount=-CUT_EXTRUDE_7_DEPTH, mode=Mode.SUBTRACT)


solid = part.part
